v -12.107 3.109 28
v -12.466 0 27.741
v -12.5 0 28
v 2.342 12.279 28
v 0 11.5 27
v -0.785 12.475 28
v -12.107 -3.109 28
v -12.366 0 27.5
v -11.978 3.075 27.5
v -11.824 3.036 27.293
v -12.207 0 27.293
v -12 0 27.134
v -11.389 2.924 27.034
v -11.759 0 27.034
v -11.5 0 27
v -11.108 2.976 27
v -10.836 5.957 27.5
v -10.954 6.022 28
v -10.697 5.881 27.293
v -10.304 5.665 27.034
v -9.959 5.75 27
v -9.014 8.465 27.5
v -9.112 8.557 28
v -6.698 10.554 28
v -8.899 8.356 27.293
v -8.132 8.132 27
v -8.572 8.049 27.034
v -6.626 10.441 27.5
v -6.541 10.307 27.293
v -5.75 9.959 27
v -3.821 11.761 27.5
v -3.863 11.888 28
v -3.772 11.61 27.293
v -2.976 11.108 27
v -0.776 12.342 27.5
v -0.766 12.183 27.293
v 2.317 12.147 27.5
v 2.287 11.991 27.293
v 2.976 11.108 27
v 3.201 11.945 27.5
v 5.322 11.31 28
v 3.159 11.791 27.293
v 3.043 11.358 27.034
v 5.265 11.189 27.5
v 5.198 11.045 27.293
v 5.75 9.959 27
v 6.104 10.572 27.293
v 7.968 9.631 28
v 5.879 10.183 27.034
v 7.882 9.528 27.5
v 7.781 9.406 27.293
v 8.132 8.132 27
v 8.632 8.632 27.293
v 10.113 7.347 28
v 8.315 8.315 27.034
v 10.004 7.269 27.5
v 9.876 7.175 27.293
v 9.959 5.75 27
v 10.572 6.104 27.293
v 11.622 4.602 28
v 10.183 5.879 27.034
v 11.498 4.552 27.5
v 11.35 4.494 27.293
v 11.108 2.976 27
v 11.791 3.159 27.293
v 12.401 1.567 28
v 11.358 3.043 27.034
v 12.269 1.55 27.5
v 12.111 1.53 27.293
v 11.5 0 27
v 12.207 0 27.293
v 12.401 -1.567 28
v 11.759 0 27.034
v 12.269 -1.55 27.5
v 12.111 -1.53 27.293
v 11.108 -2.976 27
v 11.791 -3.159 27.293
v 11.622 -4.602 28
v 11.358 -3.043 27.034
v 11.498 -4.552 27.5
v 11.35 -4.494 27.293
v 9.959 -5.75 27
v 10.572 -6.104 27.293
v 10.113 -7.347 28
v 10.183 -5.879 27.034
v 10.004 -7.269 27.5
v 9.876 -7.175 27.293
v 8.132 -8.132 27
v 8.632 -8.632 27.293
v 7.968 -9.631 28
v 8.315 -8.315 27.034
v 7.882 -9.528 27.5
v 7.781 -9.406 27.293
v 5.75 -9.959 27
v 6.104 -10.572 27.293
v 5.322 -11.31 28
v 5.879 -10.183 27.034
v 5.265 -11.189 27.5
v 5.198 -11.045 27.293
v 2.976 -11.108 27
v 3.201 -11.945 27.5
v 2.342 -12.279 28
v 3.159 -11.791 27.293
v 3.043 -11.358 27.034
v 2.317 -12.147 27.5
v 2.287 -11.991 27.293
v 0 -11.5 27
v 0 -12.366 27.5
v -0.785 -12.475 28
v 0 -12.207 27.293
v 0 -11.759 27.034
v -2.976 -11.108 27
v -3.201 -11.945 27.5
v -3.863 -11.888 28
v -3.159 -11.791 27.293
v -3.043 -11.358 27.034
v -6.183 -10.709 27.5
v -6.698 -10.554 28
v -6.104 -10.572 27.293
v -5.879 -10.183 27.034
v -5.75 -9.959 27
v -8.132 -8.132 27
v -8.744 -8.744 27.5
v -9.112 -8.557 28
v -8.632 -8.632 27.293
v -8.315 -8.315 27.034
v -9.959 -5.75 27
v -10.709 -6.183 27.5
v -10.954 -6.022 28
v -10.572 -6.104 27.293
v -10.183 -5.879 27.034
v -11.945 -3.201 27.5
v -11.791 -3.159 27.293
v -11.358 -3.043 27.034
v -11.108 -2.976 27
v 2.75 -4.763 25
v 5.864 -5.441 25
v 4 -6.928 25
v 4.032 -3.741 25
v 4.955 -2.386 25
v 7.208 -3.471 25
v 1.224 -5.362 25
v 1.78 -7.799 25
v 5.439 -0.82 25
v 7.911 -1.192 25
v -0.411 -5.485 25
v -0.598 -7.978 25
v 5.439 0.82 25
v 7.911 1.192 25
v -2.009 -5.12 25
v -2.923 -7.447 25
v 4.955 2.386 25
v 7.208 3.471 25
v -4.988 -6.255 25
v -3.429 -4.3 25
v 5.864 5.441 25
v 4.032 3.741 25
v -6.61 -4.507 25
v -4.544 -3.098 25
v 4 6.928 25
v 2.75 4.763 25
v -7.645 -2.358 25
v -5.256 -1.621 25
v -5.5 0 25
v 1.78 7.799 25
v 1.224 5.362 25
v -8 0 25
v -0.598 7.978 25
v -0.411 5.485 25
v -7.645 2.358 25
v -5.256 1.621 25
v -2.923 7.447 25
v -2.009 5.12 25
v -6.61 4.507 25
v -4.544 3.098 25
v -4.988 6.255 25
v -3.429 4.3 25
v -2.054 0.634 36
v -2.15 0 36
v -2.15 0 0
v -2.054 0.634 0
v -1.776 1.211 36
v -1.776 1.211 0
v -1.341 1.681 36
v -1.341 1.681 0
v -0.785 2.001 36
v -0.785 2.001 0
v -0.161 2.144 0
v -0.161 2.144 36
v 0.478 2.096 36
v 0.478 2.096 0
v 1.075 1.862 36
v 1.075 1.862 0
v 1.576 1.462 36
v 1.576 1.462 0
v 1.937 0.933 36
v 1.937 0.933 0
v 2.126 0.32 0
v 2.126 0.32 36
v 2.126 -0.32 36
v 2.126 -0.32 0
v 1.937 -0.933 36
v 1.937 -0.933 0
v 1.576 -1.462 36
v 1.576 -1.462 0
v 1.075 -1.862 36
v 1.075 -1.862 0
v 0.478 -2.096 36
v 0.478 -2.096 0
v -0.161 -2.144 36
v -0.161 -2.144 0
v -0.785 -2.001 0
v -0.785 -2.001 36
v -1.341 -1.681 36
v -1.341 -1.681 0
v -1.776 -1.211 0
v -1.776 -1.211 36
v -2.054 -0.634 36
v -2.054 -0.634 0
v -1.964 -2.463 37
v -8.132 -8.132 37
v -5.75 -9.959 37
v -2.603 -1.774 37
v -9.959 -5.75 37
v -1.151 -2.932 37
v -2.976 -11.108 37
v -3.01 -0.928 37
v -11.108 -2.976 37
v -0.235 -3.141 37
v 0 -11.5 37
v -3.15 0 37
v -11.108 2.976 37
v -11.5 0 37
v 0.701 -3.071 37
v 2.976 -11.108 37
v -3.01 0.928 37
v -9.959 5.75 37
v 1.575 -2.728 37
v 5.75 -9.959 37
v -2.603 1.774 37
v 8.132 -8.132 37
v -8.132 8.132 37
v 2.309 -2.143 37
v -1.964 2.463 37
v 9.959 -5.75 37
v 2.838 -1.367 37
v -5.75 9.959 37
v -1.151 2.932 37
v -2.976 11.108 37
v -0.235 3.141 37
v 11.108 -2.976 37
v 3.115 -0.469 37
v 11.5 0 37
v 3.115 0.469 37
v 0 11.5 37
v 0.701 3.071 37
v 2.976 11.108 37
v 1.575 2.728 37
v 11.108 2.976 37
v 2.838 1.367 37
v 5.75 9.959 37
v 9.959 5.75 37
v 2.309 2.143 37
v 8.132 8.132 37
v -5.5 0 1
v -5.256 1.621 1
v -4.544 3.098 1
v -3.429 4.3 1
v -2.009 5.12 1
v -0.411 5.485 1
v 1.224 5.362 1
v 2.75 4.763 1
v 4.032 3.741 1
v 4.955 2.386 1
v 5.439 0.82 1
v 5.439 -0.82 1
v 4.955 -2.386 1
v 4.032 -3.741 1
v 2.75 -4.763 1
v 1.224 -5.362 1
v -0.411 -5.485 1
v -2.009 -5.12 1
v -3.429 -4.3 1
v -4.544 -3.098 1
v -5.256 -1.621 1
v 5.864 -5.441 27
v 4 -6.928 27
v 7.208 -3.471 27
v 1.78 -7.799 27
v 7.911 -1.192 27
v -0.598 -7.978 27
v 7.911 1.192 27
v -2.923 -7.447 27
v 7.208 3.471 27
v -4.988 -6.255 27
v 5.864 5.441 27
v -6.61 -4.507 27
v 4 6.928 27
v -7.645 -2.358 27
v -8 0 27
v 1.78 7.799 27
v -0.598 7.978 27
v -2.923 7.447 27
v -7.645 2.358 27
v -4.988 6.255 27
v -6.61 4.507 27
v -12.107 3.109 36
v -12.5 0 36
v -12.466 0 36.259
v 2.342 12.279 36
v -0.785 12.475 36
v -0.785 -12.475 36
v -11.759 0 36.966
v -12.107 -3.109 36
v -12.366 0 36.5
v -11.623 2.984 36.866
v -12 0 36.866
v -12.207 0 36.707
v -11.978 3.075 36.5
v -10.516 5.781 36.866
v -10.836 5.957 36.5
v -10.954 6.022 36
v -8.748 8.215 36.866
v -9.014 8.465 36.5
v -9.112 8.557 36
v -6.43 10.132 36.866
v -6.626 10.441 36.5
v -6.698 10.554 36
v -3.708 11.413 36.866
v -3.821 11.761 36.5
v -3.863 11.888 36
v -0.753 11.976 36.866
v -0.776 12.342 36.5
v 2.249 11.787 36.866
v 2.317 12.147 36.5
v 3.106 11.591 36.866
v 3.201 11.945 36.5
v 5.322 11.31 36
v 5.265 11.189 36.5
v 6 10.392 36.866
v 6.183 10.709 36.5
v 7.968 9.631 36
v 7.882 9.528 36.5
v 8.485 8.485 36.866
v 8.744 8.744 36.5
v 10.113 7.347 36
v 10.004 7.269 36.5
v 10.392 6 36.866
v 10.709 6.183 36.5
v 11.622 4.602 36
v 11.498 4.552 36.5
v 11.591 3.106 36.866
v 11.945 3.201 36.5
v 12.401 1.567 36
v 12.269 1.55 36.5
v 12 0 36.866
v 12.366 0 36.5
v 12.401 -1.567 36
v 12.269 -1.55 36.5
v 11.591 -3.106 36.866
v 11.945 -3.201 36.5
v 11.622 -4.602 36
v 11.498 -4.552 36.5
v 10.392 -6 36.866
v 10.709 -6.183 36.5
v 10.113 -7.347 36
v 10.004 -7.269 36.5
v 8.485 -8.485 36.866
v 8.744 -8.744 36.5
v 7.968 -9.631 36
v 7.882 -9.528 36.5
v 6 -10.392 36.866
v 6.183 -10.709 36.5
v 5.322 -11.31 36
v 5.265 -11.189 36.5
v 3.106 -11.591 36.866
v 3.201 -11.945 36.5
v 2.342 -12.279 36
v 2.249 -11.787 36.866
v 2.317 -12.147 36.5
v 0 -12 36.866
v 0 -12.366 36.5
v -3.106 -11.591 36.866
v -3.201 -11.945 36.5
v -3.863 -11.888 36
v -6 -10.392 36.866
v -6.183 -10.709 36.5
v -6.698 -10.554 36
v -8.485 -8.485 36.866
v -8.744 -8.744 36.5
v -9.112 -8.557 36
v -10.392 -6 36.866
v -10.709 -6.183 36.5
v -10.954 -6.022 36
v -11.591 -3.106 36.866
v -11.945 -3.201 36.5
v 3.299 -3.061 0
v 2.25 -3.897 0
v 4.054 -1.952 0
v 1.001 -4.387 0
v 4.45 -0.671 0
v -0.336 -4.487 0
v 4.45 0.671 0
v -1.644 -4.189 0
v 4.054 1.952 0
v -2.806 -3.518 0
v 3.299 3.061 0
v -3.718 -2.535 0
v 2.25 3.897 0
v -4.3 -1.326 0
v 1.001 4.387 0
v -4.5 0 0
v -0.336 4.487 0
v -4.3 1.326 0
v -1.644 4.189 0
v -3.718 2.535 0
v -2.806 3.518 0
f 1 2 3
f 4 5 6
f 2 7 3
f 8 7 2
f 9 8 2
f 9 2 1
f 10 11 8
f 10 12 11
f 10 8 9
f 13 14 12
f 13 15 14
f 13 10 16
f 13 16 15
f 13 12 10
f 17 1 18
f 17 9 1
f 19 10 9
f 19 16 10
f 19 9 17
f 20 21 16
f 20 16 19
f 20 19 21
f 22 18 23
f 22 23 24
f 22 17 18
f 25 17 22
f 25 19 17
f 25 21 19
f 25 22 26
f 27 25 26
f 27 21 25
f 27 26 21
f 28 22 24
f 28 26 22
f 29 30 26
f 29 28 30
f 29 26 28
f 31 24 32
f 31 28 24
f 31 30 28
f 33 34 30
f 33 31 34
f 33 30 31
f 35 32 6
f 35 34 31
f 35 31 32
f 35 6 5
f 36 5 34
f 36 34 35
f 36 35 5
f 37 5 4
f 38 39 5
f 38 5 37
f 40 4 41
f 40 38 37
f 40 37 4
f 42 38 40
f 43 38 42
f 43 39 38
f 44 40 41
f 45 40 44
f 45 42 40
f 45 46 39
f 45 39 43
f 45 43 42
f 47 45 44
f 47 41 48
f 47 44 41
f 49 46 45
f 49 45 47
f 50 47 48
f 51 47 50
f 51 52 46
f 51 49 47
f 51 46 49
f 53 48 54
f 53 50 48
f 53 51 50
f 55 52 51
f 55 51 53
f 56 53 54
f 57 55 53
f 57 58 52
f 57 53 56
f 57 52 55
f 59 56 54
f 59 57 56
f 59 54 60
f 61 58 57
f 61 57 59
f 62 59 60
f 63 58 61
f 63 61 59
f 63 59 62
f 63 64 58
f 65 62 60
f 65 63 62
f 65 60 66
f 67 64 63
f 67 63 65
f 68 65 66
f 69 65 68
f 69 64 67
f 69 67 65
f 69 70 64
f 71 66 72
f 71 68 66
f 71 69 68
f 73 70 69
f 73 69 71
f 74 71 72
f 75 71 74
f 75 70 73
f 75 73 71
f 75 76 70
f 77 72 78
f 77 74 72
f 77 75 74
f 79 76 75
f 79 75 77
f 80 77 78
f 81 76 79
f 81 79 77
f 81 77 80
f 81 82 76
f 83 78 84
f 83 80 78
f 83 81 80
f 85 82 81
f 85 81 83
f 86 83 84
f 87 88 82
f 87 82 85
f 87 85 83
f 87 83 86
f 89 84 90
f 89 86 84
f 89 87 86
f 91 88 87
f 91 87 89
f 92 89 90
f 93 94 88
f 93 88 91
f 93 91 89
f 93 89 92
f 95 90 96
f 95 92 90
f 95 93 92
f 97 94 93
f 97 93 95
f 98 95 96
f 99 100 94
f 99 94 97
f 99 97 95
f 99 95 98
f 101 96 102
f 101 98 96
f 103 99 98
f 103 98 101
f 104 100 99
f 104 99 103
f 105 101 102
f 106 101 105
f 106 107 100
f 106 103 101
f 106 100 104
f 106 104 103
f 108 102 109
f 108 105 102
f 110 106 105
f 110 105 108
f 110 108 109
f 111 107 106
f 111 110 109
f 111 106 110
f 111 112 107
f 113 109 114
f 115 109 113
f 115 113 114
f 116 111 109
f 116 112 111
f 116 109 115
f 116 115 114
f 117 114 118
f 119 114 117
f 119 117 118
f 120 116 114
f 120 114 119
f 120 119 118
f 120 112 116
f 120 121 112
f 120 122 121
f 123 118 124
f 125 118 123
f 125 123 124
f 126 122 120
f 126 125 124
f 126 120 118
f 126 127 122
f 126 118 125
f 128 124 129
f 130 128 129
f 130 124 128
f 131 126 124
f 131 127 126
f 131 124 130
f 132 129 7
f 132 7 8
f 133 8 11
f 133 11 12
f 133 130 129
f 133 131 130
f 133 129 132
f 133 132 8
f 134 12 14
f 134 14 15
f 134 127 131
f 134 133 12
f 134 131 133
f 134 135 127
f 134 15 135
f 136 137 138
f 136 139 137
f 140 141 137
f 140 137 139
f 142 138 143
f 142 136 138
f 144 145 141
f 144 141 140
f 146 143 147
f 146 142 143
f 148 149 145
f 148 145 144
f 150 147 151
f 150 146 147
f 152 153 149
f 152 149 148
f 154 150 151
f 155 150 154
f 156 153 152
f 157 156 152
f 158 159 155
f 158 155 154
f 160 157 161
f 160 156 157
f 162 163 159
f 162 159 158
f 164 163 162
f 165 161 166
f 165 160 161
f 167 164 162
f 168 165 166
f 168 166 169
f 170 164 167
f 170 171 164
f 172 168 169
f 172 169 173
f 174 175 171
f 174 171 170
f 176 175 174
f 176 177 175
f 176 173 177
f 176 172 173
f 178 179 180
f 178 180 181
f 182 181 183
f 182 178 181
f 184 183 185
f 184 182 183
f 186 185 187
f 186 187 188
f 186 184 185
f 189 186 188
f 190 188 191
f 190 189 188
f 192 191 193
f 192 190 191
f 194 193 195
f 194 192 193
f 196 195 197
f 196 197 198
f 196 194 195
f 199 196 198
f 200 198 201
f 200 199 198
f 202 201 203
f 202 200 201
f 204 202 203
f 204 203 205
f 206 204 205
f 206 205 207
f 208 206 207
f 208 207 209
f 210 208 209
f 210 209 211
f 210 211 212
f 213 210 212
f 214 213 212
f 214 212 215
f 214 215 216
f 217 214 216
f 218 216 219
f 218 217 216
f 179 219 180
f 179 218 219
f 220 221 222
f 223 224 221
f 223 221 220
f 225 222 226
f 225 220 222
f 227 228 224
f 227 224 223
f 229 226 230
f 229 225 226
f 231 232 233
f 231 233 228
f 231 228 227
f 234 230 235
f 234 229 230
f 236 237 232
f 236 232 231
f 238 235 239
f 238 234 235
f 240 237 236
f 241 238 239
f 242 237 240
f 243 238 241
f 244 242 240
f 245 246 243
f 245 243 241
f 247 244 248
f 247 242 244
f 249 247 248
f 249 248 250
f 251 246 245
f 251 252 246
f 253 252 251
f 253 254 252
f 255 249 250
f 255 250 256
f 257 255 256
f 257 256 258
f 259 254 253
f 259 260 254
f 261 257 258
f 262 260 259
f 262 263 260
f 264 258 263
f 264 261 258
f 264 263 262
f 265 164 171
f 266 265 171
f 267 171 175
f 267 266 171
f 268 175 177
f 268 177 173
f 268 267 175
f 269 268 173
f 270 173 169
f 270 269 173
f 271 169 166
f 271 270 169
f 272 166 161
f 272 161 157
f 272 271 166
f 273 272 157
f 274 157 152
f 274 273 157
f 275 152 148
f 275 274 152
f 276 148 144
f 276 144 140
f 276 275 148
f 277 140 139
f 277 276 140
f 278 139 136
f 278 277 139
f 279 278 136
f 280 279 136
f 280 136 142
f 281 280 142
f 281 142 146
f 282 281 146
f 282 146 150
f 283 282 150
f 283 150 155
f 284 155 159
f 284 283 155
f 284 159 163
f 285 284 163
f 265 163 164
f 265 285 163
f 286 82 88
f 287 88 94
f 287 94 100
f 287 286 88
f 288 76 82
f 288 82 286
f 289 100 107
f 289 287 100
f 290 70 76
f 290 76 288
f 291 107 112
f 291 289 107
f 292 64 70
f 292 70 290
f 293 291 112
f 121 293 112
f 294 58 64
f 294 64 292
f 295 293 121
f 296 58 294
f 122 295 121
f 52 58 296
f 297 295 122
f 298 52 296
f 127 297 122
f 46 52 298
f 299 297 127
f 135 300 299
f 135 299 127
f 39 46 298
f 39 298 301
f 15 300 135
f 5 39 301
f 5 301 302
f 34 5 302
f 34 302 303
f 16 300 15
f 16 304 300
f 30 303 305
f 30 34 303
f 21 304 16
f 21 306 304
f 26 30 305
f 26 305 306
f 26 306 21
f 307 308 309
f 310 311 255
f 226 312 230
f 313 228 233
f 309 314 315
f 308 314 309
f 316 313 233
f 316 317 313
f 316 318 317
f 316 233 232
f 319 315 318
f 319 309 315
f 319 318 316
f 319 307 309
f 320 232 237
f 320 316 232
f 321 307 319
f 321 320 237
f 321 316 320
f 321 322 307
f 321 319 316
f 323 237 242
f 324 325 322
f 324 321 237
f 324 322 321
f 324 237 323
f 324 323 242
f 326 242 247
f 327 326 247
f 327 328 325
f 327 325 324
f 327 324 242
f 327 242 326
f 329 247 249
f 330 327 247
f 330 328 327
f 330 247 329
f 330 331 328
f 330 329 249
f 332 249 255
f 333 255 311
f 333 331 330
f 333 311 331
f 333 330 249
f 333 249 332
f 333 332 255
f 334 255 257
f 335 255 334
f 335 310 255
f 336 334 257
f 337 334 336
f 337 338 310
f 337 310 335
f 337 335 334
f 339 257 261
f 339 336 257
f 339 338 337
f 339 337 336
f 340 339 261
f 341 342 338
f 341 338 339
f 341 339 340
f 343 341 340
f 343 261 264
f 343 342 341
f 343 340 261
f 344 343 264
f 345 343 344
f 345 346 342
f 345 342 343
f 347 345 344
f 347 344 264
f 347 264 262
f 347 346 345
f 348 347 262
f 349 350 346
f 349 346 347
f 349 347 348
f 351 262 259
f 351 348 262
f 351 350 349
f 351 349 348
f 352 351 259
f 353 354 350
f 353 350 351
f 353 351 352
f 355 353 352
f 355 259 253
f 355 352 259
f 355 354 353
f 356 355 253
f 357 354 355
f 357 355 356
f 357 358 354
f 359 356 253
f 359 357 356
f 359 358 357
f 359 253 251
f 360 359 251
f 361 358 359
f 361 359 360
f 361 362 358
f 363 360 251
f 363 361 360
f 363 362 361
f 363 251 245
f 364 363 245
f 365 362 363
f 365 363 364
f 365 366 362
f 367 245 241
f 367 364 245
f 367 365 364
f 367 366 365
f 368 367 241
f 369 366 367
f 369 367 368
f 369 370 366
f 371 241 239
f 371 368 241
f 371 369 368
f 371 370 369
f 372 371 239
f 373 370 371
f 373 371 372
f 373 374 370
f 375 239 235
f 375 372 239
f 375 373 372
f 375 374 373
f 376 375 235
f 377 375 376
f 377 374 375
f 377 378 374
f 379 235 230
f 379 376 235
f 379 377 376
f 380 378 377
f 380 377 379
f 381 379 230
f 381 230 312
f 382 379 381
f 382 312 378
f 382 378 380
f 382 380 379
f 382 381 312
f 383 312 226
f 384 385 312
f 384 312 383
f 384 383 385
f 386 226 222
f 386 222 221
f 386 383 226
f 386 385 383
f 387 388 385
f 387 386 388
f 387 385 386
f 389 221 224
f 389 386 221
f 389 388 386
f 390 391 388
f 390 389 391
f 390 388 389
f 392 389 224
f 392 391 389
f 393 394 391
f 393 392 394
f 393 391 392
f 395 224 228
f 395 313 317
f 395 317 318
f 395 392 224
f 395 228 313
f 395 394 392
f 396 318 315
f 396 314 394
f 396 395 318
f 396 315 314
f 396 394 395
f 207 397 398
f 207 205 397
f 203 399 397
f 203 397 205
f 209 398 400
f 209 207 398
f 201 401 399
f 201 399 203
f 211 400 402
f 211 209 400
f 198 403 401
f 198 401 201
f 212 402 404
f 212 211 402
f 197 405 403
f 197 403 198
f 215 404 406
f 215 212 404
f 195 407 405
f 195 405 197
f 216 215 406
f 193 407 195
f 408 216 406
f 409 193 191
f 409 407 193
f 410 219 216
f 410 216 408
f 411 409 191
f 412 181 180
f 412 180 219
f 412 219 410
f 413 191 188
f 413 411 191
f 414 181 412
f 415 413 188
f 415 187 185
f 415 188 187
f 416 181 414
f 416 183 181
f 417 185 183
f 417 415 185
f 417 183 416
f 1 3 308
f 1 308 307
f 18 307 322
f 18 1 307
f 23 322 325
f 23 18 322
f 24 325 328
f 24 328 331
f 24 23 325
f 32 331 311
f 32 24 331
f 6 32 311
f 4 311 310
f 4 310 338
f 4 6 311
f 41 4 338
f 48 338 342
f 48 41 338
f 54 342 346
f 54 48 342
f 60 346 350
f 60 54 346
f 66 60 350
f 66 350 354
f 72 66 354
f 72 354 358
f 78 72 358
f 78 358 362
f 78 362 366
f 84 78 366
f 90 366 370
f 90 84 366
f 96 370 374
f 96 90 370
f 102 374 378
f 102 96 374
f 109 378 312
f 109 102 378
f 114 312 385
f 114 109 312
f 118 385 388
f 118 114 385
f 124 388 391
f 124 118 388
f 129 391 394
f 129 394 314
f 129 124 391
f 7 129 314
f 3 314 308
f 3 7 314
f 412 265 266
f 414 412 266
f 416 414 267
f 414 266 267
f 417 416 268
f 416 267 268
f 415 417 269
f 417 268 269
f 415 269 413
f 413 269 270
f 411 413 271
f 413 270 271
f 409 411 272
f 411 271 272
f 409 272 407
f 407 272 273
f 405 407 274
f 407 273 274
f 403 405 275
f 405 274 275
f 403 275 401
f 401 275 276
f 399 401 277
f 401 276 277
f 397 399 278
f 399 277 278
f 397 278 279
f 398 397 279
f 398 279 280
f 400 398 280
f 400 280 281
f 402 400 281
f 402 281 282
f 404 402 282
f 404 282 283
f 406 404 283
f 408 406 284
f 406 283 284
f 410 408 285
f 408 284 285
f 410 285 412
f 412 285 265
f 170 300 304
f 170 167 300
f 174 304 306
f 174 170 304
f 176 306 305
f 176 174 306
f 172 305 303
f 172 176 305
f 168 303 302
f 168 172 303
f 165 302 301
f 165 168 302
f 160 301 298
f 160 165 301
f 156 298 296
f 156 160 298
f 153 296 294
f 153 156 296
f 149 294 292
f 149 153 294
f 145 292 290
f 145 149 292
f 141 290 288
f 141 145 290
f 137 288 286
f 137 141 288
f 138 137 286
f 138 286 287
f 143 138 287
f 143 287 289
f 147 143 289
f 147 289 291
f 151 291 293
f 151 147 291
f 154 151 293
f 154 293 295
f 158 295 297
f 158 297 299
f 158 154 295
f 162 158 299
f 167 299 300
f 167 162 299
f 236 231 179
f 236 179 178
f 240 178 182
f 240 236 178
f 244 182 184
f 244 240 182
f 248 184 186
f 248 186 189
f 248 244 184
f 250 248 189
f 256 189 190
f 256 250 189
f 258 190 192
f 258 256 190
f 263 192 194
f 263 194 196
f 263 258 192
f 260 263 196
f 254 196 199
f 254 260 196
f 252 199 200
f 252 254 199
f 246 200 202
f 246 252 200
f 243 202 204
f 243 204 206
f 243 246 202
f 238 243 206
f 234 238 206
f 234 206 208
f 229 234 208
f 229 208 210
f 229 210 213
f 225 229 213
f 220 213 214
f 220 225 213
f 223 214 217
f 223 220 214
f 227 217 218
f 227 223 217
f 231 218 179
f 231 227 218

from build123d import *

# Parameters (mm, degrees)
F2_SIZE = 1
F3_R    = 1


with BuildPart() as f1:
    # F0 (on Front) → F1 (revolve)
    with BuildSketch(Plane.XZ):
        Polygon((-5.5, 0), (-2.15, 0), (-2.15, 37), (-12.5, 37), (-12.5, 27), (-8, 27), (-8, 25), (-5.5, 25), align=None)
    revolve(axis=Axis((0, 0, 18.5), (0, 0, -1)))

    # F2
    f2_edges = [f1.edges().sort_by_distance(p)[0] for p in [
        (5.5, 0, 0),
        (2.15, 0, 37),
    ]]
    chamfer(f2_edges, length=F2_SIZE)

    # F3
    f3_edges = [f1.edges().sort_by_distance(p)[0] for p in [
        (12.5, 0, 37),
        (12.5, 0, 27),
    ]]
    fillet(f3_edges, radius=F3_R)


solid = f1.part
